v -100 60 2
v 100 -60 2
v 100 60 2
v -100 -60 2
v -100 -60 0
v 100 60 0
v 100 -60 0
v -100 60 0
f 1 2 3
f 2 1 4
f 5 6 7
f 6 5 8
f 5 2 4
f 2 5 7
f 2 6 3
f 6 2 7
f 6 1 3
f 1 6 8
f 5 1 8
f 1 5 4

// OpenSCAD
$fn = 64;

length = 200;
width  = 120;
thickness = 2;

module sheet_mild_steel(l=length, w=width, t=thickness) {
    color([0.55, 0.56, 0.58])  // mild steel-like gray
        translate([-l/2, -w/2, 0])
            cube([l, w, t], center=false);
}

sheet_mild_steel();
